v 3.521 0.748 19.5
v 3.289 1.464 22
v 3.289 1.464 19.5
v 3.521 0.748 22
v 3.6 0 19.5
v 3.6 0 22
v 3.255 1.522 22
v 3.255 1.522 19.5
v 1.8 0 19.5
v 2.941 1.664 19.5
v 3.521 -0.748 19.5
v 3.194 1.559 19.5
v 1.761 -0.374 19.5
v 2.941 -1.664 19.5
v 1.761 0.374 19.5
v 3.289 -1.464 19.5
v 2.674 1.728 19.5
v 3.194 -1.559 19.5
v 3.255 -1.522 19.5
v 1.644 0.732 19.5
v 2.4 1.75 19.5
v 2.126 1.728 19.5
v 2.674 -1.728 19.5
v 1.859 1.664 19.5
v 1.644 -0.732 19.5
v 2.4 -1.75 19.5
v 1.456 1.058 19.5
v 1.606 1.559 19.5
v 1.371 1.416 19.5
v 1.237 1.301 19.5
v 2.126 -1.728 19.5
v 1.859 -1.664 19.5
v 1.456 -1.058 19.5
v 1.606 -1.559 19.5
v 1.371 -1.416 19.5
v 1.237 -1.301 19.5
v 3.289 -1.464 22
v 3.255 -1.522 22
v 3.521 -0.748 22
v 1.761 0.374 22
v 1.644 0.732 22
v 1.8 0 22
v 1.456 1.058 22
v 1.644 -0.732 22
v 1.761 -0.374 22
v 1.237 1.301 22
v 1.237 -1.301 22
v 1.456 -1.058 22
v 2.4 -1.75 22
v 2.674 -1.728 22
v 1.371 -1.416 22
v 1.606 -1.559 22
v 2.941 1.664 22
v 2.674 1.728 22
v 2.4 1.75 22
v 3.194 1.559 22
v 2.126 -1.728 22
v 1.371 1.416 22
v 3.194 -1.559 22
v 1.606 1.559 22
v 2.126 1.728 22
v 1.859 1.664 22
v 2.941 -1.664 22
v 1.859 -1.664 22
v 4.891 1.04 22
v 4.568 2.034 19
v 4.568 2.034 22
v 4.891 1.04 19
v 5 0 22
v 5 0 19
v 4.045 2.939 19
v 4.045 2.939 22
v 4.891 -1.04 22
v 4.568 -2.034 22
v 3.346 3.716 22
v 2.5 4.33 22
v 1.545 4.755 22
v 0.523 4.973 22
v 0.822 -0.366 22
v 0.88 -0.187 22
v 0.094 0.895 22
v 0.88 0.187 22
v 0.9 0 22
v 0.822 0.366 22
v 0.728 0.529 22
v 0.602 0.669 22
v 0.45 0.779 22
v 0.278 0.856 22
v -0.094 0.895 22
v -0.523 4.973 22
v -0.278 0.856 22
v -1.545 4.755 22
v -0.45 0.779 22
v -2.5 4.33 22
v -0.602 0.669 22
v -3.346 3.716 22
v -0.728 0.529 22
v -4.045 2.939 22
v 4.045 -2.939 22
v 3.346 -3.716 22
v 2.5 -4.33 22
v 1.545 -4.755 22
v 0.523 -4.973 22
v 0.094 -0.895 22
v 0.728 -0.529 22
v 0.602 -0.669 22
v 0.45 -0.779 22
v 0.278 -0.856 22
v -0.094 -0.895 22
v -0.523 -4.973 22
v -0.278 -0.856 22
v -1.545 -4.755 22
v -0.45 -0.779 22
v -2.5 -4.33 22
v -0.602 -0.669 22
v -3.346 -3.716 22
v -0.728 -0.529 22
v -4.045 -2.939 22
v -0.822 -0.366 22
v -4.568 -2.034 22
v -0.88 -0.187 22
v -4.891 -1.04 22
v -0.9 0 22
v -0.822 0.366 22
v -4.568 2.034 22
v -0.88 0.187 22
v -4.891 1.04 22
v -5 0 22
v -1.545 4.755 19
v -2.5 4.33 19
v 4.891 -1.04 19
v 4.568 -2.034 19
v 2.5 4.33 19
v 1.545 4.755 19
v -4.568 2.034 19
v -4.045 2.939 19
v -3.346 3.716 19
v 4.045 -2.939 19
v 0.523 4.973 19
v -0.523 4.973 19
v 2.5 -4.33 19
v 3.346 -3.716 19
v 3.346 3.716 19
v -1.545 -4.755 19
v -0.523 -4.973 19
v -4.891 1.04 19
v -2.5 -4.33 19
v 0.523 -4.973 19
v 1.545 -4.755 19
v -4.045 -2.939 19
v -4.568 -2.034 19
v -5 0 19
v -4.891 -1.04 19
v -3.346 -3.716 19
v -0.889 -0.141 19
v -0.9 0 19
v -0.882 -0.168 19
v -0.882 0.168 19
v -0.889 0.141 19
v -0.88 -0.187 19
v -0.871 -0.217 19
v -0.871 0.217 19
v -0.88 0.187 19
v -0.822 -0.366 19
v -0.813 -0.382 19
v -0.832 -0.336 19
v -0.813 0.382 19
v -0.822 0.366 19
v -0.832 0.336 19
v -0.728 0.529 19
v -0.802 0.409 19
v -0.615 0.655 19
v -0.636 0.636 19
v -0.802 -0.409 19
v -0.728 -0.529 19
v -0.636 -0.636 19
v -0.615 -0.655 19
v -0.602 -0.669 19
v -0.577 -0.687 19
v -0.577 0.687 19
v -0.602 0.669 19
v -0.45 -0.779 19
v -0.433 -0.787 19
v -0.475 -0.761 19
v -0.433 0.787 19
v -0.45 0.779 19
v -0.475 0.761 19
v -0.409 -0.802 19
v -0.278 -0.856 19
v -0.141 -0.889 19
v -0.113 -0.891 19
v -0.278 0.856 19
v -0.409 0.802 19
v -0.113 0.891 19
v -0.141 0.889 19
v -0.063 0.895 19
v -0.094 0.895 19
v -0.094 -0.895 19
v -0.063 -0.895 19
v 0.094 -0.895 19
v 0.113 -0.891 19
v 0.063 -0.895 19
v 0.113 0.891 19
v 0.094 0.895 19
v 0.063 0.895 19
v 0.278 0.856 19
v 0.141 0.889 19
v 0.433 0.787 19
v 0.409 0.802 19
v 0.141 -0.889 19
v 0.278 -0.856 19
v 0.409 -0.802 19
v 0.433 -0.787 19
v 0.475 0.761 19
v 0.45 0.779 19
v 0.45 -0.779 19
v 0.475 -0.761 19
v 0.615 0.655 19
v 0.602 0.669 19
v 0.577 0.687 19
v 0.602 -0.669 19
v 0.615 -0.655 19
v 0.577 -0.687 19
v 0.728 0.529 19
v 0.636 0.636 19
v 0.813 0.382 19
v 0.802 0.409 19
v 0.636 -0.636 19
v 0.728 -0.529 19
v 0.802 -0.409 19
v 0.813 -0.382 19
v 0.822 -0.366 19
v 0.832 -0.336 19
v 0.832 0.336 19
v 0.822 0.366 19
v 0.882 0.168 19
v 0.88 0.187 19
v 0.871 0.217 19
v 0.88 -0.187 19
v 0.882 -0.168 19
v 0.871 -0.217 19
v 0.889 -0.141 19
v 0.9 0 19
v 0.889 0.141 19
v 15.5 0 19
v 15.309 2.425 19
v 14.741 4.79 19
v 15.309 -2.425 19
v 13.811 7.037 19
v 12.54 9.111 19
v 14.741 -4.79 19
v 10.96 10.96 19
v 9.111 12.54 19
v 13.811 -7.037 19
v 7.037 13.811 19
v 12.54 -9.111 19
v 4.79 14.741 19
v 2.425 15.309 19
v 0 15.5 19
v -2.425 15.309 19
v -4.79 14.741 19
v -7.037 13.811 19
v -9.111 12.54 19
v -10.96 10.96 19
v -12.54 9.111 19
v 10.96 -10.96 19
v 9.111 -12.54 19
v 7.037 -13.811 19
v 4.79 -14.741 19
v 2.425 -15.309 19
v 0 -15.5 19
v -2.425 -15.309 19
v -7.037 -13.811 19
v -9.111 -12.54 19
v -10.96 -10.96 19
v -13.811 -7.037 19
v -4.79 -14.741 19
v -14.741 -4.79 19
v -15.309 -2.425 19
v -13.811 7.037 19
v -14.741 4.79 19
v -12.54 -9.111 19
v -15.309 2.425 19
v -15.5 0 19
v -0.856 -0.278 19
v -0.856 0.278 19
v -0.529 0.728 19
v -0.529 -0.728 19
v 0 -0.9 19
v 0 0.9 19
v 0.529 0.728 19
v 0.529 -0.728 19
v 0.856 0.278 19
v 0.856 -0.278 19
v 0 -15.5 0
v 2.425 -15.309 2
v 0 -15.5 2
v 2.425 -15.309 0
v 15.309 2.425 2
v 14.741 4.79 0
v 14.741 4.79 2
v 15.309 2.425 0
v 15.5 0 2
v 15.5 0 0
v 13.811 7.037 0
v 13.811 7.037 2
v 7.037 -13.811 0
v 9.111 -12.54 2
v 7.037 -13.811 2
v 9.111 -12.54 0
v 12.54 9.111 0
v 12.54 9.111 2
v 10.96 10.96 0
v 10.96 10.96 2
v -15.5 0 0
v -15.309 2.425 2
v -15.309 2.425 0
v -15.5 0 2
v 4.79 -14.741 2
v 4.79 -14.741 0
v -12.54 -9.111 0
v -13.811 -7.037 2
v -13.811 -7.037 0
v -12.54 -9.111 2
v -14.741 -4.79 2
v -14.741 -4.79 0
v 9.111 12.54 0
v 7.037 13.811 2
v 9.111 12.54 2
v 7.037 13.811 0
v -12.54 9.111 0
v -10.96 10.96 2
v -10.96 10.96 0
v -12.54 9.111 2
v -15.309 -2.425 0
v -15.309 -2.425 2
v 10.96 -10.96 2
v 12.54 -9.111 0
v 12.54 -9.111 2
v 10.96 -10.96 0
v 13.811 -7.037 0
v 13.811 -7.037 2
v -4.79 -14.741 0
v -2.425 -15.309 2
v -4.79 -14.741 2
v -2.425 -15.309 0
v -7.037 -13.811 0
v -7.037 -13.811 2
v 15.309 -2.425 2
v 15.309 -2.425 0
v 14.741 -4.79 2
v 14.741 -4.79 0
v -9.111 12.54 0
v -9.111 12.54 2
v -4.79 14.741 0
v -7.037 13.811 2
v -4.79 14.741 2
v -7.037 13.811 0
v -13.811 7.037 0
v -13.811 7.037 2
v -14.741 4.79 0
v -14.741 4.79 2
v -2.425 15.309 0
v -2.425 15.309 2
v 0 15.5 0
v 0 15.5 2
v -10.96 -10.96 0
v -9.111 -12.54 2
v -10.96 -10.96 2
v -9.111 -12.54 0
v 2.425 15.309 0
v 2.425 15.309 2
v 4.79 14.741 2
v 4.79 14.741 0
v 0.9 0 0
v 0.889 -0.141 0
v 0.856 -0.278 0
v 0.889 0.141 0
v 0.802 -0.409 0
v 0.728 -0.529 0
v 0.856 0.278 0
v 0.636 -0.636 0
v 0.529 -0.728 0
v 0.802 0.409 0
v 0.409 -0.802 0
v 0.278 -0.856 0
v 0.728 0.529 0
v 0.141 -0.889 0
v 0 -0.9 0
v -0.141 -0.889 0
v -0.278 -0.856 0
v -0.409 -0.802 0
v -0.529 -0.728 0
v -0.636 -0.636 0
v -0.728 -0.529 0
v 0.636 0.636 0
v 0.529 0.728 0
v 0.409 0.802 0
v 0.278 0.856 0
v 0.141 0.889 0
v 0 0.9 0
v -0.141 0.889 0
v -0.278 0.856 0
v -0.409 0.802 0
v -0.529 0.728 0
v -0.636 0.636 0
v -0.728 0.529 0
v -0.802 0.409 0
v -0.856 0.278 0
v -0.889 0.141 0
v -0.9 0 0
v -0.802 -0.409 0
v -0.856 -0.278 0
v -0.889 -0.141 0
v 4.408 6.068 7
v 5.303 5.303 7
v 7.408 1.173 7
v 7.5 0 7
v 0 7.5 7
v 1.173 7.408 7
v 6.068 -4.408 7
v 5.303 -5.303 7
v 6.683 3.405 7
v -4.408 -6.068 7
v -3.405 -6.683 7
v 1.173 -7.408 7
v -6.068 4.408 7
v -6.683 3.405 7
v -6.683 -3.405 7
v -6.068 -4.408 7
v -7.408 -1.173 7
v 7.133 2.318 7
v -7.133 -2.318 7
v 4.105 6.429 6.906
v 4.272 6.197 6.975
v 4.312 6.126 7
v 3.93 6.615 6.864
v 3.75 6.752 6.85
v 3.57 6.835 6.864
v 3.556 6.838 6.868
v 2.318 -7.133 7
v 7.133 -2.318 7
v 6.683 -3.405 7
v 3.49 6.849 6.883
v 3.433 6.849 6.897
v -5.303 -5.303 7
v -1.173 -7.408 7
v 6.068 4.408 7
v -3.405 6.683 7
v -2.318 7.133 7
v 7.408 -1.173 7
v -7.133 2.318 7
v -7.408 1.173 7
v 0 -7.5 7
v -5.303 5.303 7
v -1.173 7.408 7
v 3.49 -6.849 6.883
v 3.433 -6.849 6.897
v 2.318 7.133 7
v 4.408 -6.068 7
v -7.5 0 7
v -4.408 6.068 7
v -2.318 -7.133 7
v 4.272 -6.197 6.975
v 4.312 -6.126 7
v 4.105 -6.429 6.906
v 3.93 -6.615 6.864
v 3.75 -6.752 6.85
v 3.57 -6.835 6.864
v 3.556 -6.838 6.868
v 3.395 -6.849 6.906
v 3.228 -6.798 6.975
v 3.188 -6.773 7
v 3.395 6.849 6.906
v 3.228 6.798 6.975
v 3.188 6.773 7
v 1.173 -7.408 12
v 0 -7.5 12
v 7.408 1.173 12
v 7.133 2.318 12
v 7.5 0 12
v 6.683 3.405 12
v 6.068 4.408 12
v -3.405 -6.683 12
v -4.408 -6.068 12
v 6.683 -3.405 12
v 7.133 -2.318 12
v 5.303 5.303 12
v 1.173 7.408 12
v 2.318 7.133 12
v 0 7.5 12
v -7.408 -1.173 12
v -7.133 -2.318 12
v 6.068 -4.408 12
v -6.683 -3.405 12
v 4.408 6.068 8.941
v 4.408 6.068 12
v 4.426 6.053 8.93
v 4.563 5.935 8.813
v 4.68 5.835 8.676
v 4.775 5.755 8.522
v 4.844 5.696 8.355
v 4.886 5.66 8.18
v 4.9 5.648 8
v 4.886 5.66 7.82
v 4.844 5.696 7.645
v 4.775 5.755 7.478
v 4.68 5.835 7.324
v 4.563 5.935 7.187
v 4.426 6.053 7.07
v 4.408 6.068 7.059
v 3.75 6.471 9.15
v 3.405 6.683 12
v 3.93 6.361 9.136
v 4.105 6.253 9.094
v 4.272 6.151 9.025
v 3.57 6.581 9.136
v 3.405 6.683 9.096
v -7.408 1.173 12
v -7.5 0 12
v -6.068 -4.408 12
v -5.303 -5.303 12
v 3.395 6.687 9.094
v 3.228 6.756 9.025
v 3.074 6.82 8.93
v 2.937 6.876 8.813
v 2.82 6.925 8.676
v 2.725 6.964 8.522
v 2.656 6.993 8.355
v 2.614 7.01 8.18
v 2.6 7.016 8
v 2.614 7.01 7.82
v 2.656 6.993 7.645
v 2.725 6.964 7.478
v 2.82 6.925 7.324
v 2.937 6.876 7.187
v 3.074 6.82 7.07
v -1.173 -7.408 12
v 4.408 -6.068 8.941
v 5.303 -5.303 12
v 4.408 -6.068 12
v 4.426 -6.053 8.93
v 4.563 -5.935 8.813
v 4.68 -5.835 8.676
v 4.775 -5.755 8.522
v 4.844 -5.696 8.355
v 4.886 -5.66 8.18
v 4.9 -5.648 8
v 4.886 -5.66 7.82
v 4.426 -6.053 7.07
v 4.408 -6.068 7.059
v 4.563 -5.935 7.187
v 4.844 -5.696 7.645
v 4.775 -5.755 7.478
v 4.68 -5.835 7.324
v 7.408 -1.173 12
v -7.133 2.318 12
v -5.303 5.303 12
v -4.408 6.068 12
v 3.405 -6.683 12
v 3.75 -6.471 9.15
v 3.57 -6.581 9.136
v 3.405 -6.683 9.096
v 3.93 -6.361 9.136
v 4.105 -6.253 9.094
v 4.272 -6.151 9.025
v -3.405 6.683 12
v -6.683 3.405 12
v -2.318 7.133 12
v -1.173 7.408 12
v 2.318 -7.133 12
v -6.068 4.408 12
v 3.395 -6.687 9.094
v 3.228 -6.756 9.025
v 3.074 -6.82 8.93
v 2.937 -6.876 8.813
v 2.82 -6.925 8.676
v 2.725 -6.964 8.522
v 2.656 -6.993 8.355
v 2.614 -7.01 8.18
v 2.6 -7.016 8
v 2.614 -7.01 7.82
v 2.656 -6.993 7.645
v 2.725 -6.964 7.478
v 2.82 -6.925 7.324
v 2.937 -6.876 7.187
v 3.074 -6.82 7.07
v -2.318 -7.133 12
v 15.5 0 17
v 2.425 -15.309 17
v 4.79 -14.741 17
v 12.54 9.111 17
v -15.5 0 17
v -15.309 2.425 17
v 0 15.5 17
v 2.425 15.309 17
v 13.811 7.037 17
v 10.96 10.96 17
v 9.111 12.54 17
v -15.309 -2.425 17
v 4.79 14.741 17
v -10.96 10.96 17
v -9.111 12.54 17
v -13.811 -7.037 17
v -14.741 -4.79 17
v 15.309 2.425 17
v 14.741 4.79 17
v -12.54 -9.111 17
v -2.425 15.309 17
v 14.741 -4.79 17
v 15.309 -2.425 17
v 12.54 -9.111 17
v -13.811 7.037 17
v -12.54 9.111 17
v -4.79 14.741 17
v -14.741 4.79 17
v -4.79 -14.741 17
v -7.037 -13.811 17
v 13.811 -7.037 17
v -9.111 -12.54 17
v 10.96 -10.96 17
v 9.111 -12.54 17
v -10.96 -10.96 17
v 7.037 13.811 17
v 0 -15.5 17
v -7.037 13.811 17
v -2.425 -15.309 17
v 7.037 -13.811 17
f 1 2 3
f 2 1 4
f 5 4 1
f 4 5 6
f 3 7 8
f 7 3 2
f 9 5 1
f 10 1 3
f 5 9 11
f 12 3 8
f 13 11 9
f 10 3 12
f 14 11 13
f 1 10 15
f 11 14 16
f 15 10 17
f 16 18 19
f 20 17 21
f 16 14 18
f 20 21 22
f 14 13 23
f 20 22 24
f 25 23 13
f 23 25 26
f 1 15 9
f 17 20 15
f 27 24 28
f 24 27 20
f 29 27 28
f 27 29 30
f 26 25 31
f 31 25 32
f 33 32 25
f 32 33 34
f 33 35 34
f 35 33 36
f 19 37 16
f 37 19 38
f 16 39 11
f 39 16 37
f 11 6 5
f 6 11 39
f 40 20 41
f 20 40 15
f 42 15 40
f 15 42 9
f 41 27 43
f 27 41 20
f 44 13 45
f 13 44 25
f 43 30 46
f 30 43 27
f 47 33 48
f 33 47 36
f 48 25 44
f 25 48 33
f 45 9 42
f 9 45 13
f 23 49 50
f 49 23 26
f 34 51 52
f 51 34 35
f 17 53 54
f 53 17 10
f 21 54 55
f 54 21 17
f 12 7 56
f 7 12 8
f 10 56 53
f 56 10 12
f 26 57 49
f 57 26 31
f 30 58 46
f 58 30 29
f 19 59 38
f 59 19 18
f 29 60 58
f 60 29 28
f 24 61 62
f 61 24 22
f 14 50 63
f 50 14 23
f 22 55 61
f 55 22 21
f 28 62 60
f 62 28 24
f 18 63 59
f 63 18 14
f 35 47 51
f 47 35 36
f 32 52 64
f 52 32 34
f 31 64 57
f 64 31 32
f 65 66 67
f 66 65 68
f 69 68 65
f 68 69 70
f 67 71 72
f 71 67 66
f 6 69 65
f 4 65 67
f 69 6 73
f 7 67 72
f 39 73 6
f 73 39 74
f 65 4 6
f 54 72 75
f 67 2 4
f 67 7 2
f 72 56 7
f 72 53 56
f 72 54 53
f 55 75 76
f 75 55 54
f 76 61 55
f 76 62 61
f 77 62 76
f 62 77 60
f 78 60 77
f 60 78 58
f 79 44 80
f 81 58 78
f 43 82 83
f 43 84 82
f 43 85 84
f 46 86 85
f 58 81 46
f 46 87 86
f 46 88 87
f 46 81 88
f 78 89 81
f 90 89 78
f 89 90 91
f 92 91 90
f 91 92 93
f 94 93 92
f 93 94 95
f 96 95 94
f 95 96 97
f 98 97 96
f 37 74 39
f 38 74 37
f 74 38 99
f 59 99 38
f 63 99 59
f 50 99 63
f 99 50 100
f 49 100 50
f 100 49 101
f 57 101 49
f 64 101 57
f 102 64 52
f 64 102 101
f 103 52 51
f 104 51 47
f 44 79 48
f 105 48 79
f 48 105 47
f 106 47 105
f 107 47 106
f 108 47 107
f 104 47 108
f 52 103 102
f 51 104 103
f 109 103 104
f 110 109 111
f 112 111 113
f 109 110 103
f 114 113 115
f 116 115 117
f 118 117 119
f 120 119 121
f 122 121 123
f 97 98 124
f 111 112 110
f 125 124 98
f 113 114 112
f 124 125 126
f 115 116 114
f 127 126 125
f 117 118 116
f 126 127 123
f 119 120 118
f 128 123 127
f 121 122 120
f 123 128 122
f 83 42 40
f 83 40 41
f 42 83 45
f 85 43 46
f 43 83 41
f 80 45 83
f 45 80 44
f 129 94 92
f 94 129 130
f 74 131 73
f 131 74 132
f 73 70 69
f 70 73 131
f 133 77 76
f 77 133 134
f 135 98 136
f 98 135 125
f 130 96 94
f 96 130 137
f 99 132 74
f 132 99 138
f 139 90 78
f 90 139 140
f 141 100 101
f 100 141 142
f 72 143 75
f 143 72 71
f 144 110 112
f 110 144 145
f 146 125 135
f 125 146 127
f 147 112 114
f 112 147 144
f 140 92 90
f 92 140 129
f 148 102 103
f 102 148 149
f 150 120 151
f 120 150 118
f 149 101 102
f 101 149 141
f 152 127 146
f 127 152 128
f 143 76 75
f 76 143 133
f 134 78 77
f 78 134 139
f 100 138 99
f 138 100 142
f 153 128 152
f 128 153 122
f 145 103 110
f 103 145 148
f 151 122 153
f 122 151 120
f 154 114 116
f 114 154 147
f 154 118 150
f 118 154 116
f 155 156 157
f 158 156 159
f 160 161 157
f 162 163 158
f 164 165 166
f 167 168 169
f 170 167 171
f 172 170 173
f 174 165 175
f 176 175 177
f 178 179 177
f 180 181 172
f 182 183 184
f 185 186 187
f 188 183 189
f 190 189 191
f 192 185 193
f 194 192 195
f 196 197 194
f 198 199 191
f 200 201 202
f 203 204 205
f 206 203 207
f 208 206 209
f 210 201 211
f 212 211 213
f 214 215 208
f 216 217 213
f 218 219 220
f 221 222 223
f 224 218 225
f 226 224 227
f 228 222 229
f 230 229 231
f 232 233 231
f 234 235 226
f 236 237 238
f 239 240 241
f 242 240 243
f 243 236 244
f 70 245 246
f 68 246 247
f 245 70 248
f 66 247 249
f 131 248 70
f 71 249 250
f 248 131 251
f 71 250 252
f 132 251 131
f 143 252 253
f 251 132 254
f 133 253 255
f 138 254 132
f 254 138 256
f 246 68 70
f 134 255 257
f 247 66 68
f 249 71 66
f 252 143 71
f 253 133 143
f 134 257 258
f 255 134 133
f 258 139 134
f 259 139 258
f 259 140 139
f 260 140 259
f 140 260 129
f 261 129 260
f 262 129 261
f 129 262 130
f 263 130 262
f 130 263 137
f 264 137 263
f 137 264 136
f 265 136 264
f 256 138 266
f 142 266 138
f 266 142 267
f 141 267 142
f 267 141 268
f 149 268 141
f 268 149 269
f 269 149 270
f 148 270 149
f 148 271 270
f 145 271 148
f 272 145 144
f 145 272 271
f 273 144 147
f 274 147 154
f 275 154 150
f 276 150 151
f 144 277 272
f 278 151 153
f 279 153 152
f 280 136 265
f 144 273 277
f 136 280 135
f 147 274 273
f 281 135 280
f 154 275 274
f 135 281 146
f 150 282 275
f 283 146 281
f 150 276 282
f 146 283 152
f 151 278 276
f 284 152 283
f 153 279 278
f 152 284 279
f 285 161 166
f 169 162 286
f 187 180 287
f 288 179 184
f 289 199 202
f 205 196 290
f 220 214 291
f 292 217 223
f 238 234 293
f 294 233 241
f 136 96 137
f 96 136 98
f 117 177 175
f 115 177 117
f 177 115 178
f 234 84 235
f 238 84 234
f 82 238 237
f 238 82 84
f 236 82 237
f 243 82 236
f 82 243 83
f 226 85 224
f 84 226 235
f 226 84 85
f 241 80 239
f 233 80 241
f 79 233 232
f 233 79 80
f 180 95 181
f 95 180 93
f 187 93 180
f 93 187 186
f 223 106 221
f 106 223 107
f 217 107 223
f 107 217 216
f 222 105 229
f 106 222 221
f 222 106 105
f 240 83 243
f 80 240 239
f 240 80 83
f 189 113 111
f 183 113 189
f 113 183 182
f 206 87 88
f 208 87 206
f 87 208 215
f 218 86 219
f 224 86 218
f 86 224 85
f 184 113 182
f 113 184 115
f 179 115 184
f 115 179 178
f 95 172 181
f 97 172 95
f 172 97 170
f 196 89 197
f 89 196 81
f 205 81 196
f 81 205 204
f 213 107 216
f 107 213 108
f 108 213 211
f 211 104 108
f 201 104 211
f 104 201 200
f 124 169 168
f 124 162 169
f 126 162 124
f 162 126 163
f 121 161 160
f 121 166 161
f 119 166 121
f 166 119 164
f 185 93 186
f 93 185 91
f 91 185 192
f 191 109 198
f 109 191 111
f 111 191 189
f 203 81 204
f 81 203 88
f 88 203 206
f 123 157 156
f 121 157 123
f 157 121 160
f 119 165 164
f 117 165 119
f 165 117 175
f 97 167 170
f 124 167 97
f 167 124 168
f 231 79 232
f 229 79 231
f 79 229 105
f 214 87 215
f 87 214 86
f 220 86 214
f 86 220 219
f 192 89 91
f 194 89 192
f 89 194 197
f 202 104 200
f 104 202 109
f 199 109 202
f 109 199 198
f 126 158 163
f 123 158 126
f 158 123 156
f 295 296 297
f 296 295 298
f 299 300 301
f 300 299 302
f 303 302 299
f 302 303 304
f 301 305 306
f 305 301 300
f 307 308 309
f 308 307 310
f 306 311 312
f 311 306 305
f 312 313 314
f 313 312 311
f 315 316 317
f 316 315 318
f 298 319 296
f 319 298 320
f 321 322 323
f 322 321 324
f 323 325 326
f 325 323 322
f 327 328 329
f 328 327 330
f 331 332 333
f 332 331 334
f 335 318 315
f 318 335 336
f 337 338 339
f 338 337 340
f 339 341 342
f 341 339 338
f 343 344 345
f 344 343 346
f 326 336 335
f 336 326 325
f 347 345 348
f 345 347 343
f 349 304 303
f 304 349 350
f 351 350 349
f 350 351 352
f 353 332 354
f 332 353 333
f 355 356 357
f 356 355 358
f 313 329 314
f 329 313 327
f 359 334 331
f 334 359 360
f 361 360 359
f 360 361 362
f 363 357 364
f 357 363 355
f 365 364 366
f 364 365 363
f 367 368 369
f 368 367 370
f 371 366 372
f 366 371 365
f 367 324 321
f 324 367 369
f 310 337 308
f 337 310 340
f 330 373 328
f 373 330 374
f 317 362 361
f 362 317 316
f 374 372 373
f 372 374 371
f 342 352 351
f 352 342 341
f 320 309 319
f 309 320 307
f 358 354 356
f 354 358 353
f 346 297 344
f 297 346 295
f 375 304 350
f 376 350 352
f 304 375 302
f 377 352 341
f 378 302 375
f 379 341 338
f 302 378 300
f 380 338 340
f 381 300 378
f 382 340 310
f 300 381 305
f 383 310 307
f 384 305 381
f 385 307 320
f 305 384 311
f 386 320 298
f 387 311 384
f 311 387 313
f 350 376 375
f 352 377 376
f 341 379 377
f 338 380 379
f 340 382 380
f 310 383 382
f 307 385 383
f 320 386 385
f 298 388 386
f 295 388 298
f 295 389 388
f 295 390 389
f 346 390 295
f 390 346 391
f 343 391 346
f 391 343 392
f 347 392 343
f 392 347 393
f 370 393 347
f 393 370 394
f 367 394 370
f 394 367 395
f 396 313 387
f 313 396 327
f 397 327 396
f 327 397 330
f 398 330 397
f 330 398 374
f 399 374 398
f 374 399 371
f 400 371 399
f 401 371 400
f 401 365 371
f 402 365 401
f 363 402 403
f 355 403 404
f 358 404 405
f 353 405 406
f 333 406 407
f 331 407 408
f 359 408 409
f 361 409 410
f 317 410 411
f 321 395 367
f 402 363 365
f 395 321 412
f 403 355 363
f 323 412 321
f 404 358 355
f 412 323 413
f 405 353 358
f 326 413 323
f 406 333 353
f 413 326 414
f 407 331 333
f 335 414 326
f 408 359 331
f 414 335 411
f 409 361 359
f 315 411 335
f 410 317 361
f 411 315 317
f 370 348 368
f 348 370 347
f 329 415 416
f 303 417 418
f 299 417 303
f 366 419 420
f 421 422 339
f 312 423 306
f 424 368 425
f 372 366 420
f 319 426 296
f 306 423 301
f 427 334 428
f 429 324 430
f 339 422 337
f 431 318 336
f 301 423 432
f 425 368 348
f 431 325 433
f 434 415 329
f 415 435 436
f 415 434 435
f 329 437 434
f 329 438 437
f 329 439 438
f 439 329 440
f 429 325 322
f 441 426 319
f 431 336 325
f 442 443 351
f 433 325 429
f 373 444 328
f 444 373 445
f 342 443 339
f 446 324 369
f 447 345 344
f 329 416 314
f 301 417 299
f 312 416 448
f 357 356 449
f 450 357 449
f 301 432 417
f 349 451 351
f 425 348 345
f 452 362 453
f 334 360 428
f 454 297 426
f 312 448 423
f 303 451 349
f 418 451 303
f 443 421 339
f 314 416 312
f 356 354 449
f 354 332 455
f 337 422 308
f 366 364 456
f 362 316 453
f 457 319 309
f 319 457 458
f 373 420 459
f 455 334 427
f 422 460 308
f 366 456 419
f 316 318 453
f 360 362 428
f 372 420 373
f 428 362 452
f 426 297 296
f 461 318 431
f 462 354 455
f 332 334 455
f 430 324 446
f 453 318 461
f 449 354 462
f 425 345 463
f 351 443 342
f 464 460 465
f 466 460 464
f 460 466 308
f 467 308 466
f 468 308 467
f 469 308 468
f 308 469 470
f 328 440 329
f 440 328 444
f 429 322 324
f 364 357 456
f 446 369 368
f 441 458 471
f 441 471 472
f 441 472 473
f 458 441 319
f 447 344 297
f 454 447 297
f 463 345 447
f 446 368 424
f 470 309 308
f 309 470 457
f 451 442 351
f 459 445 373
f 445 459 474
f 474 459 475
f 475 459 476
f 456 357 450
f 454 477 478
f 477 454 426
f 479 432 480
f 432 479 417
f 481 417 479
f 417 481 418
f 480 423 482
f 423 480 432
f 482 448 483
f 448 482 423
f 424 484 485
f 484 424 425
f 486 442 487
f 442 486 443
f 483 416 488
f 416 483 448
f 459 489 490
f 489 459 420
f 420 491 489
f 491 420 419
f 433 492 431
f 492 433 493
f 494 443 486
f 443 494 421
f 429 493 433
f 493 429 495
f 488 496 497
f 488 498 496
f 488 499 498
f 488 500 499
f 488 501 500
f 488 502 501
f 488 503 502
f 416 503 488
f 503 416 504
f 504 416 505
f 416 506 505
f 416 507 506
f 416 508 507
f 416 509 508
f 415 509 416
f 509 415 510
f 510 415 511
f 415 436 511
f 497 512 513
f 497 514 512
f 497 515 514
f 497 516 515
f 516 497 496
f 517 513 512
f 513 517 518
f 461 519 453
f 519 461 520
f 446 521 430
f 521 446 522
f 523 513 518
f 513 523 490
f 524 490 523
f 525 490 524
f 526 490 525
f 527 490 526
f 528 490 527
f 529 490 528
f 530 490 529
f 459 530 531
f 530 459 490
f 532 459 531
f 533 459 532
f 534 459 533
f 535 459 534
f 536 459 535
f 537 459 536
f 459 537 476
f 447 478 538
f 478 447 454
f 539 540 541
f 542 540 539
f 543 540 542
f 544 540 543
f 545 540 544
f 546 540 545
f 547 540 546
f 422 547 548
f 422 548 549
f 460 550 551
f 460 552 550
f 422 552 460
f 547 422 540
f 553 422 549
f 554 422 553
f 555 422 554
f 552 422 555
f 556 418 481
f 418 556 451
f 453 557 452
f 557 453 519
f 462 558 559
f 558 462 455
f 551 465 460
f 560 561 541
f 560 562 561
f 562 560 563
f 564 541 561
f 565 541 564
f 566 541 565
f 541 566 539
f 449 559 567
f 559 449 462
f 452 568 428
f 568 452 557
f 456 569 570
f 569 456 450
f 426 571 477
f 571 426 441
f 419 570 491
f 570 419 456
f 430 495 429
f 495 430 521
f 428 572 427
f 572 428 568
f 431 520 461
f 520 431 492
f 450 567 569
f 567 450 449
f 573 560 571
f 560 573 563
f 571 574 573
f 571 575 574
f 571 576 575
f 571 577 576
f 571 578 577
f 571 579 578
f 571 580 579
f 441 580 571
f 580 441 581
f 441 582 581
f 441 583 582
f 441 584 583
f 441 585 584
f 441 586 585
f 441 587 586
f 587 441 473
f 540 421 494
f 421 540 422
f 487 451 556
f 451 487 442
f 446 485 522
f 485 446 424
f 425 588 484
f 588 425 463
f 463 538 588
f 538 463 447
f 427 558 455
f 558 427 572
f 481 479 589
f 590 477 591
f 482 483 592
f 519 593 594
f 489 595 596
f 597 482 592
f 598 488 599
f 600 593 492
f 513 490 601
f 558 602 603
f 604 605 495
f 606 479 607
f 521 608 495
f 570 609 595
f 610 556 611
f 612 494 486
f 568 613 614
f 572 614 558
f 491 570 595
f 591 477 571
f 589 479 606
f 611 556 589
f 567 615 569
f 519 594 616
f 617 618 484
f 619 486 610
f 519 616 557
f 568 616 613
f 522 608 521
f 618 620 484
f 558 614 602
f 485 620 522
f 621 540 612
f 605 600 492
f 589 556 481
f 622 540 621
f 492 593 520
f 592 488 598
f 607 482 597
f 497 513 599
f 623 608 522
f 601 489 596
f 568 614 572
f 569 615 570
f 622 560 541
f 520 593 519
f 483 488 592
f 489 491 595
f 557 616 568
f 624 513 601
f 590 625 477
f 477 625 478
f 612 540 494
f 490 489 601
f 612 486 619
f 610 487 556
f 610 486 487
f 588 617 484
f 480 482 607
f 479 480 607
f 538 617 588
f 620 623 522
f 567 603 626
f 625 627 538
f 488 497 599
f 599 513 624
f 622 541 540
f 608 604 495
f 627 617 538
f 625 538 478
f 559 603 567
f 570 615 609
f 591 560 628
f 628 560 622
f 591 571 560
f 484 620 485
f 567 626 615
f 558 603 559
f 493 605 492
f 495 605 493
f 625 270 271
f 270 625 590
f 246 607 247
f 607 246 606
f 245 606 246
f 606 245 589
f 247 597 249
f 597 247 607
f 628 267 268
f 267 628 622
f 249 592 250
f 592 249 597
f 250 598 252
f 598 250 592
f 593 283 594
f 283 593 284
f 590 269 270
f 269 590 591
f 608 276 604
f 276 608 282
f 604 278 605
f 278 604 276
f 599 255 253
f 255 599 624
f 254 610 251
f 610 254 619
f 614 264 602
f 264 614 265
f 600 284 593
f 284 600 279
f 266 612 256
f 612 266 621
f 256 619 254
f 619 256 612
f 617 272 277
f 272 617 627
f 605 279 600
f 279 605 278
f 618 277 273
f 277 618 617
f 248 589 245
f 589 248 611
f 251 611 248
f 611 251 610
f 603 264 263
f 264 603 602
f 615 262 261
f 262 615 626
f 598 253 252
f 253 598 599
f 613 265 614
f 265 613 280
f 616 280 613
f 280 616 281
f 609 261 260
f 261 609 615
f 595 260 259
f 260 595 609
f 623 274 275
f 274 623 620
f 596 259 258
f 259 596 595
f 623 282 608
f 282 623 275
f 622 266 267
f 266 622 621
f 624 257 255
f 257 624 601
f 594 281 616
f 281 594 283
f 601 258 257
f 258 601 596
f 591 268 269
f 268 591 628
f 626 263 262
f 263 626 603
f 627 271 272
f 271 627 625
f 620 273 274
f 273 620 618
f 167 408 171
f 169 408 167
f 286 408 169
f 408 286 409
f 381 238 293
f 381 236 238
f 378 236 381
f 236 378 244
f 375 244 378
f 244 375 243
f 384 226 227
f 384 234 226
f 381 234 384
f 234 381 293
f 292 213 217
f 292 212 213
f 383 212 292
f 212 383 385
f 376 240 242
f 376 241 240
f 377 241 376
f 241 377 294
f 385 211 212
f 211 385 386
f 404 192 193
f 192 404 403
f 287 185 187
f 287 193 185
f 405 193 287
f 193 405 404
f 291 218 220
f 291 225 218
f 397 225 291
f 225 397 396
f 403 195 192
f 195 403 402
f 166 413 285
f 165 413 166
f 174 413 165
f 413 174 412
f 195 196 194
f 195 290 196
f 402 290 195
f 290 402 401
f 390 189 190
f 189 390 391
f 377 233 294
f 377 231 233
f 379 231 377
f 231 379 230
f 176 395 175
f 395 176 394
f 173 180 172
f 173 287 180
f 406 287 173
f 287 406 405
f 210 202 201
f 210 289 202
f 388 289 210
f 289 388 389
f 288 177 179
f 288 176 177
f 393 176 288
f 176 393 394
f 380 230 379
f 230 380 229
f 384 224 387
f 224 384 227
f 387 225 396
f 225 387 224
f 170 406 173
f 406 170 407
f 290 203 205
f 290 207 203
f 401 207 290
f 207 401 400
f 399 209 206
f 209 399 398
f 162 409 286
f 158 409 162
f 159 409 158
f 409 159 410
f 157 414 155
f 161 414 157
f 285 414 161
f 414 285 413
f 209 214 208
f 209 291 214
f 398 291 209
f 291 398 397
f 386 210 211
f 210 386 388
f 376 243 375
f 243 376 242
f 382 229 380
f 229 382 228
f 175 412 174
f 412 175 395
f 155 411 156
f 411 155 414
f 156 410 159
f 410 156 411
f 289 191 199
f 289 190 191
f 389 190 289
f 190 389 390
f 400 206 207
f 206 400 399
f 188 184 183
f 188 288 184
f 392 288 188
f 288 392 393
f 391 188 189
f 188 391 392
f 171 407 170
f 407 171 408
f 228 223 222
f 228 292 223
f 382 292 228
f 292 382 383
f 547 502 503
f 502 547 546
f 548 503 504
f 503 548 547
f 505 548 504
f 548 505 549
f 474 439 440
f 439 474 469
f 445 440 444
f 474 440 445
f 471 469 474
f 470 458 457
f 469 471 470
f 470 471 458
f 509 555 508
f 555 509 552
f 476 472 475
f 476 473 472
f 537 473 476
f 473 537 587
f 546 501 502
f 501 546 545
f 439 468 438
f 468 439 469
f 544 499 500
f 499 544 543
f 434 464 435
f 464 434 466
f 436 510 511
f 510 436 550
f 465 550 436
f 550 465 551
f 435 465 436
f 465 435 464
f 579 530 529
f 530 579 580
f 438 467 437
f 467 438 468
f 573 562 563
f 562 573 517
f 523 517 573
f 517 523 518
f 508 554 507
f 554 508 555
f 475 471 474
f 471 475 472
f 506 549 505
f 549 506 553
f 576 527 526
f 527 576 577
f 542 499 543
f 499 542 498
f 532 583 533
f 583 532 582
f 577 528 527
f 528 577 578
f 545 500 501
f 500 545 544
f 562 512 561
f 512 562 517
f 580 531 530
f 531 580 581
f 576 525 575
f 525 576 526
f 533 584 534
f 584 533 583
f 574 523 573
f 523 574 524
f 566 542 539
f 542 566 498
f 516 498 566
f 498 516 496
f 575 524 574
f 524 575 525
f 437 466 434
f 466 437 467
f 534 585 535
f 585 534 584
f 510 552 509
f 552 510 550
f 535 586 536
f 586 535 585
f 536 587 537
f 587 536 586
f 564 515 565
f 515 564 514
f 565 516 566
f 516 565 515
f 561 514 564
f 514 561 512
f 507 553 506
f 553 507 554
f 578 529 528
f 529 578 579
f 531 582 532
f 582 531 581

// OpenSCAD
// file: utils.scad
Tau = 6.28318530717958647692;

function clamp(value, minValue, maxValue) = max(minValue, min(maxValue, value));
function mix(pos, start, end) = start + pos * (end -start);
function map(pos, srcStart, srcEnd, start, end) = start + ((pos-srcStart) / (srcEnd-srcStart)) * (end - start);

function smoothmix(pos, start, end) = start + (0.5-cos(pos*360/2) * 0.5 ) * (end - start);
function smoothmap(pos, srcStart, srcEnd, start, end) = start + smoothmix( (pos-srcStart) / (srcEnd - srcStart), 0, 1) * (end - start);

module horn(length = 50, angle = 45, r1 = 15, r2 = 5, aspect1 = 1, aspect2 = 1, ballStart = true, ballEnd = true, smoothness = 30, maxSegments = 30) {
    a = angle * 0.5;
    minSegments = 4;
    segments = clamp(length * 1, minSegments, maxSegments);
    segLen = 1.0*length / segments;
    segRot = a / segments;
    segLen = (length / segments) * map(a, 0, 90, 1.75, 2.5);

    for ( i = [0 : segments] ) {
        rotate([map(i, 0, segments, 0, a),0,0])
            translate([0,0,map(i, 0, segments, 0, length)])
                rotate([map(i, 0, segments, 0, a*map(a, 0, 90, 1, 0.65)),0,0])
                    scale([smoothmap(i, 0, segments, aspect1, aspect2), 1, 1])
                        cylinder(h = segLen, r1 = map(i, 0, segments+1, r1, r2), r2 = map(i + 2, 0, segments+1, r1, r2), $fn=smoothness);
    }

    if (ballStart) {
        scale([aspect1, 1, 1])
            sphere(r=r1, $fn=smoothness);
        
    }

    if (ballEnd) {
        rotate([a,0,0])
            translate([0,0,length])
                rotate([a*map(a, 0, 90, 1, 0.65),0,0])
                    scale([aspect2, 1, 1])
                        translate([0, 0, segLen])
                            sphere(r=map(segments + 2, 0, segments+1, r1, r2), $fn=smoothness);
        
    }
}

module doubleHorn(l1 = 50, l2 = 30, a1 = 30, a2 = 20, r1 = 5, r2 = 15, r3 = 10, aspect1 = 1, aspect2 = 1, aspect3 = 1, ballStart = true, ballEnd = true, smoothness = 30, , maxSegments = 30) {
    horn(l1, a1, r2, r1, aspect2, aspect1, true, ballStart, smoothness, maxSegments);
    rotate([0, 180, 0])
        horn(l2, a2, r2, r3, aspect2, aspect3, false, ballEnd, smoothness, maxSegments);
}

module cutPlane(size = 1000) {
    translate([-size/2, -size/2, -size])
        cube([size, size, size]);
}

module roundedAngle(a = 90, r = 10, l = 40, h = 5, rot = 0, extraThickness = 0) {
    rotate([0,0,rot]) {
        cylinder(h, r = r, $fn=40);
        rotate([0,0,a/2]) {
            translate([-r + h/2, 0, 0]) {
                cube([r + extraThickness, l, h]);
                translate([0, 0, h/2])
                    rotate([-90,0,0])
                        cylinder(h=l, r = h/2, $fn=40);
            }
        }            
        rotate([0,0,-a/2]) {
            translate([-extraThickness - h/2, 0, 0]) {
                cube([r + extraThickness, l, h]);
                translate([r + extraThickness, 0, h/2])
                    rotate([-90,0,0])
                        cylinder(h=l, r = h/2, $fn=40);
            }
        }
    }
}


module splitAlongZ0(xOffset = 30, yOffset = 30, cutSize = 1000) {

    difference() {
        translate([-xOffset/2, -yOffset/2, 0])
            child(0);
        cutPlane(cutSize);
    }    

    difference() {
        translate([xOffset/2, yOffset/2, 0])
            rotate([0, 180, 0])
                child(0);
        cutPlane(cutSize);
    }       
}


// Fastening knob holes - use pieces of filament to fasten
module knob(knobH = 8, knobD = 3, hole = true) {
    glap = 0.6;

    if (hole) {
        translate([0,0,-knobH/2]) cylinder(h = knobH+glap/2, r = knobD/2+glap/4, $fn=20);
        //cube([knobD, knobD, knobH], center = true);
    }
    else {
        cylinder(h = knobH - glap/2, r = knobD/2 - glap/4, $fn=20);
        //cube([knobD - glap, knobH - glap, knobD - glap]);
    }
}

module cylinderTorus(h, outerR, innerR, center = false, smoothness = 30) {
    difference() {
        cylinder(h = h, r = outerR, center = center, $fn=smoothness);
        translate([0,0,-1])
            cylinder(h = h+2, r = innerR, center = center, $fn=smoothness);
    }
}


//roundedAngle();
// horn();
//doubleHorn();
// main file
// Adapter for cheap miniature eccentric micro gearmotor from ebay.

use <utils.scad>;

microMotorMount();

module microMotorMount(pulleyDiam = 15, pulleyW = 5, pulleyWallH = 8, pulleyWallW = 2, pulleySlopeW = 5, axleDiam = 1.5) {
    adapterW = 3;
    slideRingW = 1;
    slideRingD = axleDiam + 4;
    smoothness = 30;
    totalPulleyW = pulleyW + 2*pulleyWallW + 2*pulleySlopeW;
    glap = 0.15;
    
    translate([0,0, totalPulleyW]) motorAdapter(pulleyDiam + pulleyWallH*2, adapterW, axleDiam, glap = glap);
    pulley(pulleyDiam, pulleyW, pulleyWallH, pulleyWallW, pulleySlopeW, axleDiam, glap = glap);
}


module motorAdapter(diam = 10, height = 5, axleDiam = 1.5, glap = 0.1, smoothness = 30) {
    h = max(height, 3);
    r = min(max(diam/2, 10/2), 5);
    gripSlotH = 2.5;

    difference() {
        //Base
        cylinder(h = h, r = r, $fn = smoothness);
        
        // Axis
        translate([0,0,-1])
            cylinder(h = h+2, r = axleDiam/2 + glap, $fn = smoothness);
        
        // Grip slot
        translate([0, 0, height - gripSlotH])
            intersection() {
                cylinderTorus(gripSlotH+1, 3.6, 1.8);
                translate([2.4, 0, 0])
                    cylinder(h=gripSlotH+1, r = 3.5/2, $fn = 40);
            }
    }

}


module pulley(pulleyDiam = 10, pulleyW = 10, pulleyWallH = 10, pulleyWallW = 2, pulleySlopeW = 3, axleDiam = 1.5, wireHoleDiam = 2, glap = 0.1, smoothness = 40) {
    innerR = pulleyDiam/2;
    outerR = innerR + pulleyWallH;
    totalW = 2*pulleyWallH + 2*pulleySlopeW + pulleyW;

    difference() {
        // Pulley body
        union() {
            translate([0,0,0])                                      
                cylinder(h = pulleyWallW, r = outerR, $fn = smoothness);
            translate([0,0,pulleyWallW])
                cylinder(h = pulleySlopeW, r1 = outerR, r2 = innerR, $fn = smoothness);
            translate([0,0,pulleyWallW + pulleySlopeW])
                cylinder(h = pulleyW, r = innerR, $fn = smoothness);
            translate([0,0,pulleyWallW + pulleySlopeW + pulleyW])
                cylinder(h = pulleySlopeW, r1 = innerR, r2 = outerR, $fn = smoothness);
            translate([0,0,pulleyWallW + pulleySlopeW + pulleyW + pulleySlopeW])
                cylinder(h = pulleyWallW, r = outerR, $fn = smoothness);
        }
        
        // Axle hole
        translate([0,0,-1])  
            cylinder(h = totalW + 2, r = axleDiam / 2 + glap, $fn = smoothness);
            
        // Hole for attaching wire
        if (wireHoleDiam > 0) {
            translate([axleDiam/2 + wireHoleDiam/2 + 2,0,pulleyWallW + pulleySlopeW + wireHoleDiam/2])  
                rotate([90,0,0])
                    cylinder(h = outerR + 2, r = wireHoleDiam / 2 + glap, $fn = smoothness, center=true);
        }
    }
}
